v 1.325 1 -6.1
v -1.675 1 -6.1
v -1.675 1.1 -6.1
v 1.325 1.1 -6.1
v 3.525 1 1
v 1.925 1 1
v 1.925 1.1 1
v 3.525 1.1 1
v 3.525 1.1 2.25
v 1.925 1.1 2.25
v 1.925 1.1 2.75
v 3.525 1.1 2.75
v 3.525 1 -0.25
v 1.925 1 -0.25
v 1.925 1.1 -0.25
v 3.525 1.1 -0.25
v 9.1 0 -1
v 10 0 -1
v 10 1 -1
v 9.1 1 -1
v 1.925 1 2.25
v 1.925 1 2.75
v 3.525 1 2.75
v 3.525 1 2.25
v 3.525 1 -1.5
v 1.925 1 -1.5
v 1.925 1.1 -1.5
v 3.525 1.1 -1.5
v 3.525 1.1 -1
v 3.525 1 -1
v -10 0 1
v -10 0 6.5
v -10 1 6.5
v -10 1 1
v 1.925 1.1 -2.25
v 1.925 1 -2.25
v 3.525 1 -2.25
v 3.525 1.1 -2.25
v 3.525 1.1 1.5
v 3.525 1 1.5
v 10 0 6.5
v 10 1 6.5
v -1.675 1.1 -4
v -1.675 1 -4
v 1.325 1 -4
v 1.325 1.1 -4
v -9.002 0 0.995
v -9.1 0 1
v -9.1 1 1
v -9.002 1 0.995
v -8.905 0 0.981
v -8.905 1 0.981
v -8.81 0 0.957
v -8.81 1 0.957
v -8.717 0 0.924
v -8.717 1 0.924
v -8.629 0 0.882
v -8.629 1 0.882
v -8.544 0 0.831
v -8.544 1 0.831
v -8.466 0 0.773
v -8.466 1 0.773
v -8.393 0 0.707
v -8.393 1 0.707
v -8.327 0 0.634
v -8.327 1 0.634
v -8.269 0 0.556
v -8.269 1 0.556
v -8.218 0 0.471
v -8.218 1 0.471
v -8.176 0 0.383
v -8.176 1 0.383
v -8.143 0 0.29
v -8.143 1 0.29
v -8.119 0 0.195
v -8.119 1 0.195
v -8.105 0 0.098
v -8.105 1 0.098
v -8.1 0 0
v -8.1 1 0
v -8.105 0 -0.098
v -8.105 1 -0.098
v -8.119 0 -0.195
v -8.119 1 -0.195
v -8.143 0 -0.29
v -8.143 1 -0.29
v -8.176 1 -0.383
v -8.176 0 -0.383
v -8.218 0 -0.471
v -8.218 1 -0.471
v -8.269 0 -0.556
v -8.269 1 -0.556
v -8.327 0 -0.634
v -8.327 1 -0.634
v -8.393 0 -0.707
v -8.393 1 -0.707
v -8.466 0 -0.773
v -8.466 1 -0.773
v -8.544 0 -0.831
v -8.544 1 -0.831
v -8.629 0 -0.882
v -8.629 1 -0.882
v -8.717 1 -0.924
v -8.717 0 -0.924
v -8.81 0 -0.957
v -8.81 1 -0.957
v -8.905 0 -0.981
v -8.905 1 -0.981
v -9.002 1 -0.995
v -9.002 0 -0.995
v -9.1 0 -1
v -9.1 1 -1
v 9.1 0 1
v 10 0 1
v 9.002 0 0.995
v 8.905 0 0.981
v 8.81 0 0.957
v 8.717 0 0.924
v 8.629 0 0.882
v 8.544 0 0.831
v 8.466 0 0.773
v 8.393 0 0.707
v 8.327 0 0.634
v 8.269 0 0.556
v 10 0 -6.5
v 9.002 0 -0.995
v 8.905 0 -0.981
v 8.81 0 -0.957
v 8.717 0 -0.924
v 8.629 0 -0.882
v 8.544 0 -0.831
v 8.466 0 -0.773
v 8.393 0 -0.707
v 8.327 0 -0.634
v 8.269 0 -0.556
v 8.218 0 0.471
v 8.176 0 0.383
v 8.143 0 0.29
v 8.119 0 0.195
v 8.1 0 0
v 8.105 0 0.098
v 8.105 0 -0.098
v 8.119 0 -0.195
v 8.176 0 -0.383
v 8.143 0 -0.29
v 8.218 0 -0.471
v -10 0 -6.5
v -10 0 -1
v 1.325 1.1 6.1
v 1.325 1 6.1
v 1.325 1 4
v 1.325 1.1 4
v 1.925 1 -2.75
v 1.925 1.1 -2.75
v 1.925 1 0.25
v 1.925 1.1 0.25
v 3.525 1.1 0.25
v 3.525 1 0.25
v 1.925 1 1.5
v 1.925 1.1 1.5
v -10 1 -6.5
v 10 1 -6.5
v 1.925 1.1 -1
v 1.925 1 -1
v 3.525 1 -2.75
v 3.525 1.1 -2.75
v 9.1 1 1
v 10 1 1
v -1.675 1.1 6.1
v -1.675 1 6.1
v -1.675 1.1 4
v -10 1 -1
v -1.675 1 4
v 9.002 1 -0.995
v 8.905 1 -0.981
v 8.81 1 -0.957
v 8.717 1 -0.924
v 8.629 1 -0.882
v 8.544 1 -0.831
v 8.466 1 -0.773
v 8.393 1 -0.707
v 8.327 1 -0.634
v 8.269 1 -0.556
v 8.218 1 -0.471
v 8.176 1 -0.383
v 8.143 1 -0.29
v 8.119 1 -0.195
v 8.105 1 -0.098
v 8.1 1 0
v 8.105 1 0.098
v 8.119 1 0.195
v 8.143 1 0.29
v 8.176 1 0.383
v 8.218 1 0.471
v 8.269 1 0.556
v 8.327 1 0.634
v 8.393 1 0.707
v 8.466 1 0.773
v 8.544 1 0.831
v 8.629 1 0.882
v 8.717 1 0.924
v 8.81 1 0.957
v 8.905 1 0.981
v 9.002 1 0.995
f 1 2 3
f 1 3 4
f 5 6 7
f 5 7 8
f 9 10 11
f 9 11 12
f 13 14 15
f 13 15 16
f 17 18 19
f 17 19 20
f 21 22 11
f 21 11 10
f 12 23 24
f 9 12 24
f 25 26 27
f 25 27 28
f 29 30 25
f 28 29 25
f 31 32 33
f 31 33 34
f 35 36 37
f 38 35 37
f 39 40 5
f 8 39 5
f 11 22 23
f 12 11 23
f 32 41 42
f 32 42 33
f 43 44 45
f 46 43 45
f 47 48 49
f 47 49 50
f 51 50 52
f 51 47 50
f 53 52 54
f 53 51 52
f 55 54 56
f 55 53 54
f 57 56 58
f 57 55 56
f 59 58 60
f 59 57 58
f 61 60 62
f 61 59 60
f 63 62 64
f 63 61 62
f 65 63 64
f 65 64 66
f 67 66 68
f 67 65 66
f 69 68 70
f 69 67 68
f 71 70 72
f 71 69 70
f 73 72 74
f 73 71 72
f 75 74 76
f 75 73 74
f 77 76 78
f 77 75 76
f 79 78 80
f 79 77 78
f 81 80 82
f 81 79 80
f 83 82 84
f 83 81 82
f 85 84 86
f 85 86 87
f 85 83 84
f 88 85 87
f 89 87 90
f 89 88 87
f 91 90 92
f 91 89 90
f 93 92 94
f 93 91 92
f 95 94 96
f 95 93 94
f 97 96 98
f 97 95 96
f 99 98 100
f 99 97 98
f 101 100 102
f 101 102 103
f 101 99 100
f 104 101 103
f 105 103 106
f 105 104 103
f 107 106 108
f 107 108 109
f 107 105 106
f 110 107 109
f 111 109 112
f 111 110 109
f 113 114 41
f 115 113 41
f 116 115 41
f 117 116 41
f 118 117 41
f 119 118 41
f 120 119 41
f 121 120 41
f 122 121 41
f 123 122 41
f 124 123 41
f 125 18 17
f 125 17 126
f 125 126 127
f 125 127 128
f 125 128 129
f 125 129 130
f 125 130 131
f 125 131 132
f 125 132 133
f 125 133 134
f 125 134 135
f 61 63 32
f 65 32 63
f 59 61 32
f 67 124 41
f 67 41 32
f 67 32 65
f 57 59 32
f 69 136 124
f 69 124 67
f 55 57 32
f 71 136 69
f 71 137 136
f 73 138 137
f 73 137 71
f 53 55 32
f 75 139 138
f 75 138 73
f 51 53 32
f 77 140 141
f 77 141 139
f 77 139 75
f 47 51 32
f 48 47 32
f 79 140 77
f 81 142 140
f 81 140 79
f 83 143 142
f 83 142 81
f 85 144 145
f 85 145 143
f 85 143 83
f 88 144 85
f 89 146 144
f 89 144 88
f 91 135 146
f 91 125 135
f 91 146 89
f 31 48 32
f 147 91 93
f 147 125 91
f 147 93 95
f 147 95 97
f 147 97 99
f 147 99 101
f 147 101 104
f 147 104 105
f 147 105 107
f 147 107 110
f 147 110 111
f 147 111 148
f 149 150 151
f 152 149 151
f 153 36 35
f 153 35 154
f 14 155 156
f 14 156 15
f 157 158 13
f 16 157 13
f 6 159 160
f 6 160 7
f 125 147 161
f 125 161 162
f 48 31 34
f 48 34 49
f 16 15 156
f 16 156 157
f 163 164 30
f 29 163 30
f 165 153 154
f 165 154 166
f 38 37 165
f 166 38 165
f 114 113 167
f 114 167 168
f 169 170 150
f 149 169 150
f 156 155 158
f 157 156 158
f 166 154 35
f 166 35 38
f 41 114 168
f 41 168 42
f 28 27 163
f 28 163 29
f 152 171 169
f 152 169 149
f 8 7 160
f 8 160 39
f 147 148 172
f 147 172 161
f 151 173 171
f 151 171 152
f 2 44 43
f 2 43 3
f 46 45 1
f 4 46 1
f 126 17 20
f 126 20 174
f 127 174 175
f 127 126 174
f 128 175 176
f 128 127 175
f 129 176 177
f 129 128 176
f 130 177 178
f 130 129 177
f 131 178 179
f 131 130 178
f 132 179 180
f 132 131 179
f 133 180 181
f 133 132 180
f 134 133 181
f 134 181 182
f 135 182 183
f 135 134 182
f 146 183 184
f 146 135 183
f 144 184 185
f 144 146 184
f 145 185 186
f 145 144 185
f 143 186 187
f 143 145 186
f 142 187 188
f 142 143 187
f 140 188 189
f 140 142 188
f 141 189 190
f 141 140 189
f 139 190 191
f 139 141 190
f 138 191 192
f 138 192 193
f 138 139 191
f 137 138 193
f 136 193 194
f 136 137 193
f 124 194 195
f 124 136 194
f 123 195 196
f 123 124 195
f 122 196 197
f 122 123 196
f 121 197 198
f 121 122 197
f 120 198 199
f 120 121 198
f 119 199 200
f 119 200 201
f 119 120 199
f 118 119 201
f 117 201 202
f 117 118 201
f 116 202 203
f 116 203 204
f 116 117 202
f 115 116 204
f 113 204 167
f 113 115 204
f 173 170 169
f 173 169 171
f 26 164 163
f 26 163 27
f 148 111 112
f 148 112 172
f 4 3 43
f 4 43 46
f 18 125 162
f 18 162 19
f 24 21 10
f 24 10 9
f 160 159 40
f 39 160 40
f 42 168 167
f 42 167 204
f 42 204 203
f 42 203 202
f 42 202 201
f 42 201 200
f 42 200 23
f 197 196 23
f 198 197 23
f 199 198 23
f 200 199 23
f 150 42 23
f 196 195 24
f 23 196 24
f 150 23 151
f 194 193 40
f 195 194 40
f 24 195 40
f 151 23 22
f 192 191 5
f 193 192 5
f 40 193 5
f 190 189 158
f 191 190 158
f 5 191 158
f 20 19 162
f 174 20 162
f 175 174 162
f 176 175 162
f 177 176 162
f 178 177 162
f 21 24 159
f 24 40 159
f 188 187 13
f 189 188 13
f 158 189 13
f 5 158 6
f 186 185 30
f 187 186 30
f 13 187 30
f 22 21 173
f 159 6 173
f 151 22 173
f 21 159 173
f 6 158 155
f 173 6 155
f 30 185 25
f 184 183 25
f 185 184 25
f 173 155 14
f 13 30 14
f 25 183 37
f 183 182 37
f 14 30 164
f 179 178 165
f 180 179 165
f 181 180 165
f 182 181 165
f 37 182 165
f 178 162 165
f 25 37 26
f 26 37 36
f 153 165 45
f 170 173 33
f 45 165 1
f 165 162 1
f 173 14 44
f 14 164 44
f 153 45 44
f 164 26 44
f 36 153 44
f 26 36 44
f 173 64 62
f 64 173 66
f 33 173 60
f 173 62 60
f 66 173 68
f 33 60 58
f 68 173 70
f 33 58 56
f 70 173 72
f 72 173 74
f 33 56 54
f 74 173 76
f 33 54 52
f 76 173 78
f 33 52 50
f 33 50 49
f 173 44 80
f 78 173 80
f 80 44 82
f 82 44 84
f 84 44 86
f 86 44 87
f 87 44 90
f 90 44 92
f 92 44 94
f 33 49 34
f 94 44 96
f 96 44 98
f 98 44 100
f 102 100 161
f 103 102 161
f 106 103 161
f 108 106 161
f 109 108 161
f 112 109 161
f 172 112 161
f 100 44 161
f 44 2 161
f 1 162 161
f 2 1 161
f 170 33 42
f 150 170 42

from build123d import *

# Parameters (mm, degrees)
BOSS_EXTRUDE1_DEPTH = 1
SKETCH2_W           = 3
SKETCH2_H           = 2.1
SKETCH2_W_2         = 1.6
SKETCH2_H_2         = 0.5
BOSS_EXTRUDE2_DEPTH = 0.1


with BuildPart() as part:
    # Sketch1 → Boss-Extrude1 (new body)
    with BuildSketch(Plane(origin=(0, 0, 0), x_dir=(1, 0, 0), z_dir=(0, 1, 0))):
        with BuildLine():
            Line((-10, 6.5), (10, 6.5))
            Line((10, 6.5), (10, 1))
            Line((10, 1), (9.1, 1))
            ThreePointArc((9.1, 1), (8.1, 0), (9.1, -1))
            Line((9.1, -1), (10, -1))
            Line((10, -1), (10, -6.5))
            Line((10, -6.5), (-10, -6.5))
            Line((-10, -6.5), (-10, -1))
            Line((-10, -1), (-9.1, -1))
            ThreePointArc((-9.1, -1), (-8.1, 0), (-9.1, 1))
            Line((-9.1, 1), (-10, 1))
            Line((-10, 1), (-10, 6.5))
        make_face()
    extrude(amount=BOSS_EXTRUDE1_DEPTH)

    # Sketch2 → Boss-Extrude2 (add)
    with BuildSketch(Plane(origin=(0, 1, 0), x_dir=(1, 0, 0), z_dir=(0, 1, 0))):
        with Locations((-0.175, -5.05)):
            Rectangle(SKETCH2_W, SKETCH2_H)
        with Locations((2.725, -2.5)):
            Rectangle(SKETCH2_W_2, SKETCH2_H_2)
        with Locations((2.725, -1.25)):
            Rectangle(SKETCH2_W_2, SKETCH2_H_2)
        with Locations((2.725, 0)):
            Rectangle(SKETCH2_W_2, SKETCH2_H_2)
        with Locations((2.725, 1.25)):
            Rectangle(SKETCH2_W_2, SKETCH2_H_2)
        with Locations((2.725, 2.5)):
            Rectangle(SKETCH2_W_2, SKETCH2_H_2)
        with Locations((-0.175, 5.05)):
            Rectangle(SKETCH2_W, SKETCH2_H)
    extrude(amount=BOSS_EXTRUDE2_DEPTH)


solid = part.part
